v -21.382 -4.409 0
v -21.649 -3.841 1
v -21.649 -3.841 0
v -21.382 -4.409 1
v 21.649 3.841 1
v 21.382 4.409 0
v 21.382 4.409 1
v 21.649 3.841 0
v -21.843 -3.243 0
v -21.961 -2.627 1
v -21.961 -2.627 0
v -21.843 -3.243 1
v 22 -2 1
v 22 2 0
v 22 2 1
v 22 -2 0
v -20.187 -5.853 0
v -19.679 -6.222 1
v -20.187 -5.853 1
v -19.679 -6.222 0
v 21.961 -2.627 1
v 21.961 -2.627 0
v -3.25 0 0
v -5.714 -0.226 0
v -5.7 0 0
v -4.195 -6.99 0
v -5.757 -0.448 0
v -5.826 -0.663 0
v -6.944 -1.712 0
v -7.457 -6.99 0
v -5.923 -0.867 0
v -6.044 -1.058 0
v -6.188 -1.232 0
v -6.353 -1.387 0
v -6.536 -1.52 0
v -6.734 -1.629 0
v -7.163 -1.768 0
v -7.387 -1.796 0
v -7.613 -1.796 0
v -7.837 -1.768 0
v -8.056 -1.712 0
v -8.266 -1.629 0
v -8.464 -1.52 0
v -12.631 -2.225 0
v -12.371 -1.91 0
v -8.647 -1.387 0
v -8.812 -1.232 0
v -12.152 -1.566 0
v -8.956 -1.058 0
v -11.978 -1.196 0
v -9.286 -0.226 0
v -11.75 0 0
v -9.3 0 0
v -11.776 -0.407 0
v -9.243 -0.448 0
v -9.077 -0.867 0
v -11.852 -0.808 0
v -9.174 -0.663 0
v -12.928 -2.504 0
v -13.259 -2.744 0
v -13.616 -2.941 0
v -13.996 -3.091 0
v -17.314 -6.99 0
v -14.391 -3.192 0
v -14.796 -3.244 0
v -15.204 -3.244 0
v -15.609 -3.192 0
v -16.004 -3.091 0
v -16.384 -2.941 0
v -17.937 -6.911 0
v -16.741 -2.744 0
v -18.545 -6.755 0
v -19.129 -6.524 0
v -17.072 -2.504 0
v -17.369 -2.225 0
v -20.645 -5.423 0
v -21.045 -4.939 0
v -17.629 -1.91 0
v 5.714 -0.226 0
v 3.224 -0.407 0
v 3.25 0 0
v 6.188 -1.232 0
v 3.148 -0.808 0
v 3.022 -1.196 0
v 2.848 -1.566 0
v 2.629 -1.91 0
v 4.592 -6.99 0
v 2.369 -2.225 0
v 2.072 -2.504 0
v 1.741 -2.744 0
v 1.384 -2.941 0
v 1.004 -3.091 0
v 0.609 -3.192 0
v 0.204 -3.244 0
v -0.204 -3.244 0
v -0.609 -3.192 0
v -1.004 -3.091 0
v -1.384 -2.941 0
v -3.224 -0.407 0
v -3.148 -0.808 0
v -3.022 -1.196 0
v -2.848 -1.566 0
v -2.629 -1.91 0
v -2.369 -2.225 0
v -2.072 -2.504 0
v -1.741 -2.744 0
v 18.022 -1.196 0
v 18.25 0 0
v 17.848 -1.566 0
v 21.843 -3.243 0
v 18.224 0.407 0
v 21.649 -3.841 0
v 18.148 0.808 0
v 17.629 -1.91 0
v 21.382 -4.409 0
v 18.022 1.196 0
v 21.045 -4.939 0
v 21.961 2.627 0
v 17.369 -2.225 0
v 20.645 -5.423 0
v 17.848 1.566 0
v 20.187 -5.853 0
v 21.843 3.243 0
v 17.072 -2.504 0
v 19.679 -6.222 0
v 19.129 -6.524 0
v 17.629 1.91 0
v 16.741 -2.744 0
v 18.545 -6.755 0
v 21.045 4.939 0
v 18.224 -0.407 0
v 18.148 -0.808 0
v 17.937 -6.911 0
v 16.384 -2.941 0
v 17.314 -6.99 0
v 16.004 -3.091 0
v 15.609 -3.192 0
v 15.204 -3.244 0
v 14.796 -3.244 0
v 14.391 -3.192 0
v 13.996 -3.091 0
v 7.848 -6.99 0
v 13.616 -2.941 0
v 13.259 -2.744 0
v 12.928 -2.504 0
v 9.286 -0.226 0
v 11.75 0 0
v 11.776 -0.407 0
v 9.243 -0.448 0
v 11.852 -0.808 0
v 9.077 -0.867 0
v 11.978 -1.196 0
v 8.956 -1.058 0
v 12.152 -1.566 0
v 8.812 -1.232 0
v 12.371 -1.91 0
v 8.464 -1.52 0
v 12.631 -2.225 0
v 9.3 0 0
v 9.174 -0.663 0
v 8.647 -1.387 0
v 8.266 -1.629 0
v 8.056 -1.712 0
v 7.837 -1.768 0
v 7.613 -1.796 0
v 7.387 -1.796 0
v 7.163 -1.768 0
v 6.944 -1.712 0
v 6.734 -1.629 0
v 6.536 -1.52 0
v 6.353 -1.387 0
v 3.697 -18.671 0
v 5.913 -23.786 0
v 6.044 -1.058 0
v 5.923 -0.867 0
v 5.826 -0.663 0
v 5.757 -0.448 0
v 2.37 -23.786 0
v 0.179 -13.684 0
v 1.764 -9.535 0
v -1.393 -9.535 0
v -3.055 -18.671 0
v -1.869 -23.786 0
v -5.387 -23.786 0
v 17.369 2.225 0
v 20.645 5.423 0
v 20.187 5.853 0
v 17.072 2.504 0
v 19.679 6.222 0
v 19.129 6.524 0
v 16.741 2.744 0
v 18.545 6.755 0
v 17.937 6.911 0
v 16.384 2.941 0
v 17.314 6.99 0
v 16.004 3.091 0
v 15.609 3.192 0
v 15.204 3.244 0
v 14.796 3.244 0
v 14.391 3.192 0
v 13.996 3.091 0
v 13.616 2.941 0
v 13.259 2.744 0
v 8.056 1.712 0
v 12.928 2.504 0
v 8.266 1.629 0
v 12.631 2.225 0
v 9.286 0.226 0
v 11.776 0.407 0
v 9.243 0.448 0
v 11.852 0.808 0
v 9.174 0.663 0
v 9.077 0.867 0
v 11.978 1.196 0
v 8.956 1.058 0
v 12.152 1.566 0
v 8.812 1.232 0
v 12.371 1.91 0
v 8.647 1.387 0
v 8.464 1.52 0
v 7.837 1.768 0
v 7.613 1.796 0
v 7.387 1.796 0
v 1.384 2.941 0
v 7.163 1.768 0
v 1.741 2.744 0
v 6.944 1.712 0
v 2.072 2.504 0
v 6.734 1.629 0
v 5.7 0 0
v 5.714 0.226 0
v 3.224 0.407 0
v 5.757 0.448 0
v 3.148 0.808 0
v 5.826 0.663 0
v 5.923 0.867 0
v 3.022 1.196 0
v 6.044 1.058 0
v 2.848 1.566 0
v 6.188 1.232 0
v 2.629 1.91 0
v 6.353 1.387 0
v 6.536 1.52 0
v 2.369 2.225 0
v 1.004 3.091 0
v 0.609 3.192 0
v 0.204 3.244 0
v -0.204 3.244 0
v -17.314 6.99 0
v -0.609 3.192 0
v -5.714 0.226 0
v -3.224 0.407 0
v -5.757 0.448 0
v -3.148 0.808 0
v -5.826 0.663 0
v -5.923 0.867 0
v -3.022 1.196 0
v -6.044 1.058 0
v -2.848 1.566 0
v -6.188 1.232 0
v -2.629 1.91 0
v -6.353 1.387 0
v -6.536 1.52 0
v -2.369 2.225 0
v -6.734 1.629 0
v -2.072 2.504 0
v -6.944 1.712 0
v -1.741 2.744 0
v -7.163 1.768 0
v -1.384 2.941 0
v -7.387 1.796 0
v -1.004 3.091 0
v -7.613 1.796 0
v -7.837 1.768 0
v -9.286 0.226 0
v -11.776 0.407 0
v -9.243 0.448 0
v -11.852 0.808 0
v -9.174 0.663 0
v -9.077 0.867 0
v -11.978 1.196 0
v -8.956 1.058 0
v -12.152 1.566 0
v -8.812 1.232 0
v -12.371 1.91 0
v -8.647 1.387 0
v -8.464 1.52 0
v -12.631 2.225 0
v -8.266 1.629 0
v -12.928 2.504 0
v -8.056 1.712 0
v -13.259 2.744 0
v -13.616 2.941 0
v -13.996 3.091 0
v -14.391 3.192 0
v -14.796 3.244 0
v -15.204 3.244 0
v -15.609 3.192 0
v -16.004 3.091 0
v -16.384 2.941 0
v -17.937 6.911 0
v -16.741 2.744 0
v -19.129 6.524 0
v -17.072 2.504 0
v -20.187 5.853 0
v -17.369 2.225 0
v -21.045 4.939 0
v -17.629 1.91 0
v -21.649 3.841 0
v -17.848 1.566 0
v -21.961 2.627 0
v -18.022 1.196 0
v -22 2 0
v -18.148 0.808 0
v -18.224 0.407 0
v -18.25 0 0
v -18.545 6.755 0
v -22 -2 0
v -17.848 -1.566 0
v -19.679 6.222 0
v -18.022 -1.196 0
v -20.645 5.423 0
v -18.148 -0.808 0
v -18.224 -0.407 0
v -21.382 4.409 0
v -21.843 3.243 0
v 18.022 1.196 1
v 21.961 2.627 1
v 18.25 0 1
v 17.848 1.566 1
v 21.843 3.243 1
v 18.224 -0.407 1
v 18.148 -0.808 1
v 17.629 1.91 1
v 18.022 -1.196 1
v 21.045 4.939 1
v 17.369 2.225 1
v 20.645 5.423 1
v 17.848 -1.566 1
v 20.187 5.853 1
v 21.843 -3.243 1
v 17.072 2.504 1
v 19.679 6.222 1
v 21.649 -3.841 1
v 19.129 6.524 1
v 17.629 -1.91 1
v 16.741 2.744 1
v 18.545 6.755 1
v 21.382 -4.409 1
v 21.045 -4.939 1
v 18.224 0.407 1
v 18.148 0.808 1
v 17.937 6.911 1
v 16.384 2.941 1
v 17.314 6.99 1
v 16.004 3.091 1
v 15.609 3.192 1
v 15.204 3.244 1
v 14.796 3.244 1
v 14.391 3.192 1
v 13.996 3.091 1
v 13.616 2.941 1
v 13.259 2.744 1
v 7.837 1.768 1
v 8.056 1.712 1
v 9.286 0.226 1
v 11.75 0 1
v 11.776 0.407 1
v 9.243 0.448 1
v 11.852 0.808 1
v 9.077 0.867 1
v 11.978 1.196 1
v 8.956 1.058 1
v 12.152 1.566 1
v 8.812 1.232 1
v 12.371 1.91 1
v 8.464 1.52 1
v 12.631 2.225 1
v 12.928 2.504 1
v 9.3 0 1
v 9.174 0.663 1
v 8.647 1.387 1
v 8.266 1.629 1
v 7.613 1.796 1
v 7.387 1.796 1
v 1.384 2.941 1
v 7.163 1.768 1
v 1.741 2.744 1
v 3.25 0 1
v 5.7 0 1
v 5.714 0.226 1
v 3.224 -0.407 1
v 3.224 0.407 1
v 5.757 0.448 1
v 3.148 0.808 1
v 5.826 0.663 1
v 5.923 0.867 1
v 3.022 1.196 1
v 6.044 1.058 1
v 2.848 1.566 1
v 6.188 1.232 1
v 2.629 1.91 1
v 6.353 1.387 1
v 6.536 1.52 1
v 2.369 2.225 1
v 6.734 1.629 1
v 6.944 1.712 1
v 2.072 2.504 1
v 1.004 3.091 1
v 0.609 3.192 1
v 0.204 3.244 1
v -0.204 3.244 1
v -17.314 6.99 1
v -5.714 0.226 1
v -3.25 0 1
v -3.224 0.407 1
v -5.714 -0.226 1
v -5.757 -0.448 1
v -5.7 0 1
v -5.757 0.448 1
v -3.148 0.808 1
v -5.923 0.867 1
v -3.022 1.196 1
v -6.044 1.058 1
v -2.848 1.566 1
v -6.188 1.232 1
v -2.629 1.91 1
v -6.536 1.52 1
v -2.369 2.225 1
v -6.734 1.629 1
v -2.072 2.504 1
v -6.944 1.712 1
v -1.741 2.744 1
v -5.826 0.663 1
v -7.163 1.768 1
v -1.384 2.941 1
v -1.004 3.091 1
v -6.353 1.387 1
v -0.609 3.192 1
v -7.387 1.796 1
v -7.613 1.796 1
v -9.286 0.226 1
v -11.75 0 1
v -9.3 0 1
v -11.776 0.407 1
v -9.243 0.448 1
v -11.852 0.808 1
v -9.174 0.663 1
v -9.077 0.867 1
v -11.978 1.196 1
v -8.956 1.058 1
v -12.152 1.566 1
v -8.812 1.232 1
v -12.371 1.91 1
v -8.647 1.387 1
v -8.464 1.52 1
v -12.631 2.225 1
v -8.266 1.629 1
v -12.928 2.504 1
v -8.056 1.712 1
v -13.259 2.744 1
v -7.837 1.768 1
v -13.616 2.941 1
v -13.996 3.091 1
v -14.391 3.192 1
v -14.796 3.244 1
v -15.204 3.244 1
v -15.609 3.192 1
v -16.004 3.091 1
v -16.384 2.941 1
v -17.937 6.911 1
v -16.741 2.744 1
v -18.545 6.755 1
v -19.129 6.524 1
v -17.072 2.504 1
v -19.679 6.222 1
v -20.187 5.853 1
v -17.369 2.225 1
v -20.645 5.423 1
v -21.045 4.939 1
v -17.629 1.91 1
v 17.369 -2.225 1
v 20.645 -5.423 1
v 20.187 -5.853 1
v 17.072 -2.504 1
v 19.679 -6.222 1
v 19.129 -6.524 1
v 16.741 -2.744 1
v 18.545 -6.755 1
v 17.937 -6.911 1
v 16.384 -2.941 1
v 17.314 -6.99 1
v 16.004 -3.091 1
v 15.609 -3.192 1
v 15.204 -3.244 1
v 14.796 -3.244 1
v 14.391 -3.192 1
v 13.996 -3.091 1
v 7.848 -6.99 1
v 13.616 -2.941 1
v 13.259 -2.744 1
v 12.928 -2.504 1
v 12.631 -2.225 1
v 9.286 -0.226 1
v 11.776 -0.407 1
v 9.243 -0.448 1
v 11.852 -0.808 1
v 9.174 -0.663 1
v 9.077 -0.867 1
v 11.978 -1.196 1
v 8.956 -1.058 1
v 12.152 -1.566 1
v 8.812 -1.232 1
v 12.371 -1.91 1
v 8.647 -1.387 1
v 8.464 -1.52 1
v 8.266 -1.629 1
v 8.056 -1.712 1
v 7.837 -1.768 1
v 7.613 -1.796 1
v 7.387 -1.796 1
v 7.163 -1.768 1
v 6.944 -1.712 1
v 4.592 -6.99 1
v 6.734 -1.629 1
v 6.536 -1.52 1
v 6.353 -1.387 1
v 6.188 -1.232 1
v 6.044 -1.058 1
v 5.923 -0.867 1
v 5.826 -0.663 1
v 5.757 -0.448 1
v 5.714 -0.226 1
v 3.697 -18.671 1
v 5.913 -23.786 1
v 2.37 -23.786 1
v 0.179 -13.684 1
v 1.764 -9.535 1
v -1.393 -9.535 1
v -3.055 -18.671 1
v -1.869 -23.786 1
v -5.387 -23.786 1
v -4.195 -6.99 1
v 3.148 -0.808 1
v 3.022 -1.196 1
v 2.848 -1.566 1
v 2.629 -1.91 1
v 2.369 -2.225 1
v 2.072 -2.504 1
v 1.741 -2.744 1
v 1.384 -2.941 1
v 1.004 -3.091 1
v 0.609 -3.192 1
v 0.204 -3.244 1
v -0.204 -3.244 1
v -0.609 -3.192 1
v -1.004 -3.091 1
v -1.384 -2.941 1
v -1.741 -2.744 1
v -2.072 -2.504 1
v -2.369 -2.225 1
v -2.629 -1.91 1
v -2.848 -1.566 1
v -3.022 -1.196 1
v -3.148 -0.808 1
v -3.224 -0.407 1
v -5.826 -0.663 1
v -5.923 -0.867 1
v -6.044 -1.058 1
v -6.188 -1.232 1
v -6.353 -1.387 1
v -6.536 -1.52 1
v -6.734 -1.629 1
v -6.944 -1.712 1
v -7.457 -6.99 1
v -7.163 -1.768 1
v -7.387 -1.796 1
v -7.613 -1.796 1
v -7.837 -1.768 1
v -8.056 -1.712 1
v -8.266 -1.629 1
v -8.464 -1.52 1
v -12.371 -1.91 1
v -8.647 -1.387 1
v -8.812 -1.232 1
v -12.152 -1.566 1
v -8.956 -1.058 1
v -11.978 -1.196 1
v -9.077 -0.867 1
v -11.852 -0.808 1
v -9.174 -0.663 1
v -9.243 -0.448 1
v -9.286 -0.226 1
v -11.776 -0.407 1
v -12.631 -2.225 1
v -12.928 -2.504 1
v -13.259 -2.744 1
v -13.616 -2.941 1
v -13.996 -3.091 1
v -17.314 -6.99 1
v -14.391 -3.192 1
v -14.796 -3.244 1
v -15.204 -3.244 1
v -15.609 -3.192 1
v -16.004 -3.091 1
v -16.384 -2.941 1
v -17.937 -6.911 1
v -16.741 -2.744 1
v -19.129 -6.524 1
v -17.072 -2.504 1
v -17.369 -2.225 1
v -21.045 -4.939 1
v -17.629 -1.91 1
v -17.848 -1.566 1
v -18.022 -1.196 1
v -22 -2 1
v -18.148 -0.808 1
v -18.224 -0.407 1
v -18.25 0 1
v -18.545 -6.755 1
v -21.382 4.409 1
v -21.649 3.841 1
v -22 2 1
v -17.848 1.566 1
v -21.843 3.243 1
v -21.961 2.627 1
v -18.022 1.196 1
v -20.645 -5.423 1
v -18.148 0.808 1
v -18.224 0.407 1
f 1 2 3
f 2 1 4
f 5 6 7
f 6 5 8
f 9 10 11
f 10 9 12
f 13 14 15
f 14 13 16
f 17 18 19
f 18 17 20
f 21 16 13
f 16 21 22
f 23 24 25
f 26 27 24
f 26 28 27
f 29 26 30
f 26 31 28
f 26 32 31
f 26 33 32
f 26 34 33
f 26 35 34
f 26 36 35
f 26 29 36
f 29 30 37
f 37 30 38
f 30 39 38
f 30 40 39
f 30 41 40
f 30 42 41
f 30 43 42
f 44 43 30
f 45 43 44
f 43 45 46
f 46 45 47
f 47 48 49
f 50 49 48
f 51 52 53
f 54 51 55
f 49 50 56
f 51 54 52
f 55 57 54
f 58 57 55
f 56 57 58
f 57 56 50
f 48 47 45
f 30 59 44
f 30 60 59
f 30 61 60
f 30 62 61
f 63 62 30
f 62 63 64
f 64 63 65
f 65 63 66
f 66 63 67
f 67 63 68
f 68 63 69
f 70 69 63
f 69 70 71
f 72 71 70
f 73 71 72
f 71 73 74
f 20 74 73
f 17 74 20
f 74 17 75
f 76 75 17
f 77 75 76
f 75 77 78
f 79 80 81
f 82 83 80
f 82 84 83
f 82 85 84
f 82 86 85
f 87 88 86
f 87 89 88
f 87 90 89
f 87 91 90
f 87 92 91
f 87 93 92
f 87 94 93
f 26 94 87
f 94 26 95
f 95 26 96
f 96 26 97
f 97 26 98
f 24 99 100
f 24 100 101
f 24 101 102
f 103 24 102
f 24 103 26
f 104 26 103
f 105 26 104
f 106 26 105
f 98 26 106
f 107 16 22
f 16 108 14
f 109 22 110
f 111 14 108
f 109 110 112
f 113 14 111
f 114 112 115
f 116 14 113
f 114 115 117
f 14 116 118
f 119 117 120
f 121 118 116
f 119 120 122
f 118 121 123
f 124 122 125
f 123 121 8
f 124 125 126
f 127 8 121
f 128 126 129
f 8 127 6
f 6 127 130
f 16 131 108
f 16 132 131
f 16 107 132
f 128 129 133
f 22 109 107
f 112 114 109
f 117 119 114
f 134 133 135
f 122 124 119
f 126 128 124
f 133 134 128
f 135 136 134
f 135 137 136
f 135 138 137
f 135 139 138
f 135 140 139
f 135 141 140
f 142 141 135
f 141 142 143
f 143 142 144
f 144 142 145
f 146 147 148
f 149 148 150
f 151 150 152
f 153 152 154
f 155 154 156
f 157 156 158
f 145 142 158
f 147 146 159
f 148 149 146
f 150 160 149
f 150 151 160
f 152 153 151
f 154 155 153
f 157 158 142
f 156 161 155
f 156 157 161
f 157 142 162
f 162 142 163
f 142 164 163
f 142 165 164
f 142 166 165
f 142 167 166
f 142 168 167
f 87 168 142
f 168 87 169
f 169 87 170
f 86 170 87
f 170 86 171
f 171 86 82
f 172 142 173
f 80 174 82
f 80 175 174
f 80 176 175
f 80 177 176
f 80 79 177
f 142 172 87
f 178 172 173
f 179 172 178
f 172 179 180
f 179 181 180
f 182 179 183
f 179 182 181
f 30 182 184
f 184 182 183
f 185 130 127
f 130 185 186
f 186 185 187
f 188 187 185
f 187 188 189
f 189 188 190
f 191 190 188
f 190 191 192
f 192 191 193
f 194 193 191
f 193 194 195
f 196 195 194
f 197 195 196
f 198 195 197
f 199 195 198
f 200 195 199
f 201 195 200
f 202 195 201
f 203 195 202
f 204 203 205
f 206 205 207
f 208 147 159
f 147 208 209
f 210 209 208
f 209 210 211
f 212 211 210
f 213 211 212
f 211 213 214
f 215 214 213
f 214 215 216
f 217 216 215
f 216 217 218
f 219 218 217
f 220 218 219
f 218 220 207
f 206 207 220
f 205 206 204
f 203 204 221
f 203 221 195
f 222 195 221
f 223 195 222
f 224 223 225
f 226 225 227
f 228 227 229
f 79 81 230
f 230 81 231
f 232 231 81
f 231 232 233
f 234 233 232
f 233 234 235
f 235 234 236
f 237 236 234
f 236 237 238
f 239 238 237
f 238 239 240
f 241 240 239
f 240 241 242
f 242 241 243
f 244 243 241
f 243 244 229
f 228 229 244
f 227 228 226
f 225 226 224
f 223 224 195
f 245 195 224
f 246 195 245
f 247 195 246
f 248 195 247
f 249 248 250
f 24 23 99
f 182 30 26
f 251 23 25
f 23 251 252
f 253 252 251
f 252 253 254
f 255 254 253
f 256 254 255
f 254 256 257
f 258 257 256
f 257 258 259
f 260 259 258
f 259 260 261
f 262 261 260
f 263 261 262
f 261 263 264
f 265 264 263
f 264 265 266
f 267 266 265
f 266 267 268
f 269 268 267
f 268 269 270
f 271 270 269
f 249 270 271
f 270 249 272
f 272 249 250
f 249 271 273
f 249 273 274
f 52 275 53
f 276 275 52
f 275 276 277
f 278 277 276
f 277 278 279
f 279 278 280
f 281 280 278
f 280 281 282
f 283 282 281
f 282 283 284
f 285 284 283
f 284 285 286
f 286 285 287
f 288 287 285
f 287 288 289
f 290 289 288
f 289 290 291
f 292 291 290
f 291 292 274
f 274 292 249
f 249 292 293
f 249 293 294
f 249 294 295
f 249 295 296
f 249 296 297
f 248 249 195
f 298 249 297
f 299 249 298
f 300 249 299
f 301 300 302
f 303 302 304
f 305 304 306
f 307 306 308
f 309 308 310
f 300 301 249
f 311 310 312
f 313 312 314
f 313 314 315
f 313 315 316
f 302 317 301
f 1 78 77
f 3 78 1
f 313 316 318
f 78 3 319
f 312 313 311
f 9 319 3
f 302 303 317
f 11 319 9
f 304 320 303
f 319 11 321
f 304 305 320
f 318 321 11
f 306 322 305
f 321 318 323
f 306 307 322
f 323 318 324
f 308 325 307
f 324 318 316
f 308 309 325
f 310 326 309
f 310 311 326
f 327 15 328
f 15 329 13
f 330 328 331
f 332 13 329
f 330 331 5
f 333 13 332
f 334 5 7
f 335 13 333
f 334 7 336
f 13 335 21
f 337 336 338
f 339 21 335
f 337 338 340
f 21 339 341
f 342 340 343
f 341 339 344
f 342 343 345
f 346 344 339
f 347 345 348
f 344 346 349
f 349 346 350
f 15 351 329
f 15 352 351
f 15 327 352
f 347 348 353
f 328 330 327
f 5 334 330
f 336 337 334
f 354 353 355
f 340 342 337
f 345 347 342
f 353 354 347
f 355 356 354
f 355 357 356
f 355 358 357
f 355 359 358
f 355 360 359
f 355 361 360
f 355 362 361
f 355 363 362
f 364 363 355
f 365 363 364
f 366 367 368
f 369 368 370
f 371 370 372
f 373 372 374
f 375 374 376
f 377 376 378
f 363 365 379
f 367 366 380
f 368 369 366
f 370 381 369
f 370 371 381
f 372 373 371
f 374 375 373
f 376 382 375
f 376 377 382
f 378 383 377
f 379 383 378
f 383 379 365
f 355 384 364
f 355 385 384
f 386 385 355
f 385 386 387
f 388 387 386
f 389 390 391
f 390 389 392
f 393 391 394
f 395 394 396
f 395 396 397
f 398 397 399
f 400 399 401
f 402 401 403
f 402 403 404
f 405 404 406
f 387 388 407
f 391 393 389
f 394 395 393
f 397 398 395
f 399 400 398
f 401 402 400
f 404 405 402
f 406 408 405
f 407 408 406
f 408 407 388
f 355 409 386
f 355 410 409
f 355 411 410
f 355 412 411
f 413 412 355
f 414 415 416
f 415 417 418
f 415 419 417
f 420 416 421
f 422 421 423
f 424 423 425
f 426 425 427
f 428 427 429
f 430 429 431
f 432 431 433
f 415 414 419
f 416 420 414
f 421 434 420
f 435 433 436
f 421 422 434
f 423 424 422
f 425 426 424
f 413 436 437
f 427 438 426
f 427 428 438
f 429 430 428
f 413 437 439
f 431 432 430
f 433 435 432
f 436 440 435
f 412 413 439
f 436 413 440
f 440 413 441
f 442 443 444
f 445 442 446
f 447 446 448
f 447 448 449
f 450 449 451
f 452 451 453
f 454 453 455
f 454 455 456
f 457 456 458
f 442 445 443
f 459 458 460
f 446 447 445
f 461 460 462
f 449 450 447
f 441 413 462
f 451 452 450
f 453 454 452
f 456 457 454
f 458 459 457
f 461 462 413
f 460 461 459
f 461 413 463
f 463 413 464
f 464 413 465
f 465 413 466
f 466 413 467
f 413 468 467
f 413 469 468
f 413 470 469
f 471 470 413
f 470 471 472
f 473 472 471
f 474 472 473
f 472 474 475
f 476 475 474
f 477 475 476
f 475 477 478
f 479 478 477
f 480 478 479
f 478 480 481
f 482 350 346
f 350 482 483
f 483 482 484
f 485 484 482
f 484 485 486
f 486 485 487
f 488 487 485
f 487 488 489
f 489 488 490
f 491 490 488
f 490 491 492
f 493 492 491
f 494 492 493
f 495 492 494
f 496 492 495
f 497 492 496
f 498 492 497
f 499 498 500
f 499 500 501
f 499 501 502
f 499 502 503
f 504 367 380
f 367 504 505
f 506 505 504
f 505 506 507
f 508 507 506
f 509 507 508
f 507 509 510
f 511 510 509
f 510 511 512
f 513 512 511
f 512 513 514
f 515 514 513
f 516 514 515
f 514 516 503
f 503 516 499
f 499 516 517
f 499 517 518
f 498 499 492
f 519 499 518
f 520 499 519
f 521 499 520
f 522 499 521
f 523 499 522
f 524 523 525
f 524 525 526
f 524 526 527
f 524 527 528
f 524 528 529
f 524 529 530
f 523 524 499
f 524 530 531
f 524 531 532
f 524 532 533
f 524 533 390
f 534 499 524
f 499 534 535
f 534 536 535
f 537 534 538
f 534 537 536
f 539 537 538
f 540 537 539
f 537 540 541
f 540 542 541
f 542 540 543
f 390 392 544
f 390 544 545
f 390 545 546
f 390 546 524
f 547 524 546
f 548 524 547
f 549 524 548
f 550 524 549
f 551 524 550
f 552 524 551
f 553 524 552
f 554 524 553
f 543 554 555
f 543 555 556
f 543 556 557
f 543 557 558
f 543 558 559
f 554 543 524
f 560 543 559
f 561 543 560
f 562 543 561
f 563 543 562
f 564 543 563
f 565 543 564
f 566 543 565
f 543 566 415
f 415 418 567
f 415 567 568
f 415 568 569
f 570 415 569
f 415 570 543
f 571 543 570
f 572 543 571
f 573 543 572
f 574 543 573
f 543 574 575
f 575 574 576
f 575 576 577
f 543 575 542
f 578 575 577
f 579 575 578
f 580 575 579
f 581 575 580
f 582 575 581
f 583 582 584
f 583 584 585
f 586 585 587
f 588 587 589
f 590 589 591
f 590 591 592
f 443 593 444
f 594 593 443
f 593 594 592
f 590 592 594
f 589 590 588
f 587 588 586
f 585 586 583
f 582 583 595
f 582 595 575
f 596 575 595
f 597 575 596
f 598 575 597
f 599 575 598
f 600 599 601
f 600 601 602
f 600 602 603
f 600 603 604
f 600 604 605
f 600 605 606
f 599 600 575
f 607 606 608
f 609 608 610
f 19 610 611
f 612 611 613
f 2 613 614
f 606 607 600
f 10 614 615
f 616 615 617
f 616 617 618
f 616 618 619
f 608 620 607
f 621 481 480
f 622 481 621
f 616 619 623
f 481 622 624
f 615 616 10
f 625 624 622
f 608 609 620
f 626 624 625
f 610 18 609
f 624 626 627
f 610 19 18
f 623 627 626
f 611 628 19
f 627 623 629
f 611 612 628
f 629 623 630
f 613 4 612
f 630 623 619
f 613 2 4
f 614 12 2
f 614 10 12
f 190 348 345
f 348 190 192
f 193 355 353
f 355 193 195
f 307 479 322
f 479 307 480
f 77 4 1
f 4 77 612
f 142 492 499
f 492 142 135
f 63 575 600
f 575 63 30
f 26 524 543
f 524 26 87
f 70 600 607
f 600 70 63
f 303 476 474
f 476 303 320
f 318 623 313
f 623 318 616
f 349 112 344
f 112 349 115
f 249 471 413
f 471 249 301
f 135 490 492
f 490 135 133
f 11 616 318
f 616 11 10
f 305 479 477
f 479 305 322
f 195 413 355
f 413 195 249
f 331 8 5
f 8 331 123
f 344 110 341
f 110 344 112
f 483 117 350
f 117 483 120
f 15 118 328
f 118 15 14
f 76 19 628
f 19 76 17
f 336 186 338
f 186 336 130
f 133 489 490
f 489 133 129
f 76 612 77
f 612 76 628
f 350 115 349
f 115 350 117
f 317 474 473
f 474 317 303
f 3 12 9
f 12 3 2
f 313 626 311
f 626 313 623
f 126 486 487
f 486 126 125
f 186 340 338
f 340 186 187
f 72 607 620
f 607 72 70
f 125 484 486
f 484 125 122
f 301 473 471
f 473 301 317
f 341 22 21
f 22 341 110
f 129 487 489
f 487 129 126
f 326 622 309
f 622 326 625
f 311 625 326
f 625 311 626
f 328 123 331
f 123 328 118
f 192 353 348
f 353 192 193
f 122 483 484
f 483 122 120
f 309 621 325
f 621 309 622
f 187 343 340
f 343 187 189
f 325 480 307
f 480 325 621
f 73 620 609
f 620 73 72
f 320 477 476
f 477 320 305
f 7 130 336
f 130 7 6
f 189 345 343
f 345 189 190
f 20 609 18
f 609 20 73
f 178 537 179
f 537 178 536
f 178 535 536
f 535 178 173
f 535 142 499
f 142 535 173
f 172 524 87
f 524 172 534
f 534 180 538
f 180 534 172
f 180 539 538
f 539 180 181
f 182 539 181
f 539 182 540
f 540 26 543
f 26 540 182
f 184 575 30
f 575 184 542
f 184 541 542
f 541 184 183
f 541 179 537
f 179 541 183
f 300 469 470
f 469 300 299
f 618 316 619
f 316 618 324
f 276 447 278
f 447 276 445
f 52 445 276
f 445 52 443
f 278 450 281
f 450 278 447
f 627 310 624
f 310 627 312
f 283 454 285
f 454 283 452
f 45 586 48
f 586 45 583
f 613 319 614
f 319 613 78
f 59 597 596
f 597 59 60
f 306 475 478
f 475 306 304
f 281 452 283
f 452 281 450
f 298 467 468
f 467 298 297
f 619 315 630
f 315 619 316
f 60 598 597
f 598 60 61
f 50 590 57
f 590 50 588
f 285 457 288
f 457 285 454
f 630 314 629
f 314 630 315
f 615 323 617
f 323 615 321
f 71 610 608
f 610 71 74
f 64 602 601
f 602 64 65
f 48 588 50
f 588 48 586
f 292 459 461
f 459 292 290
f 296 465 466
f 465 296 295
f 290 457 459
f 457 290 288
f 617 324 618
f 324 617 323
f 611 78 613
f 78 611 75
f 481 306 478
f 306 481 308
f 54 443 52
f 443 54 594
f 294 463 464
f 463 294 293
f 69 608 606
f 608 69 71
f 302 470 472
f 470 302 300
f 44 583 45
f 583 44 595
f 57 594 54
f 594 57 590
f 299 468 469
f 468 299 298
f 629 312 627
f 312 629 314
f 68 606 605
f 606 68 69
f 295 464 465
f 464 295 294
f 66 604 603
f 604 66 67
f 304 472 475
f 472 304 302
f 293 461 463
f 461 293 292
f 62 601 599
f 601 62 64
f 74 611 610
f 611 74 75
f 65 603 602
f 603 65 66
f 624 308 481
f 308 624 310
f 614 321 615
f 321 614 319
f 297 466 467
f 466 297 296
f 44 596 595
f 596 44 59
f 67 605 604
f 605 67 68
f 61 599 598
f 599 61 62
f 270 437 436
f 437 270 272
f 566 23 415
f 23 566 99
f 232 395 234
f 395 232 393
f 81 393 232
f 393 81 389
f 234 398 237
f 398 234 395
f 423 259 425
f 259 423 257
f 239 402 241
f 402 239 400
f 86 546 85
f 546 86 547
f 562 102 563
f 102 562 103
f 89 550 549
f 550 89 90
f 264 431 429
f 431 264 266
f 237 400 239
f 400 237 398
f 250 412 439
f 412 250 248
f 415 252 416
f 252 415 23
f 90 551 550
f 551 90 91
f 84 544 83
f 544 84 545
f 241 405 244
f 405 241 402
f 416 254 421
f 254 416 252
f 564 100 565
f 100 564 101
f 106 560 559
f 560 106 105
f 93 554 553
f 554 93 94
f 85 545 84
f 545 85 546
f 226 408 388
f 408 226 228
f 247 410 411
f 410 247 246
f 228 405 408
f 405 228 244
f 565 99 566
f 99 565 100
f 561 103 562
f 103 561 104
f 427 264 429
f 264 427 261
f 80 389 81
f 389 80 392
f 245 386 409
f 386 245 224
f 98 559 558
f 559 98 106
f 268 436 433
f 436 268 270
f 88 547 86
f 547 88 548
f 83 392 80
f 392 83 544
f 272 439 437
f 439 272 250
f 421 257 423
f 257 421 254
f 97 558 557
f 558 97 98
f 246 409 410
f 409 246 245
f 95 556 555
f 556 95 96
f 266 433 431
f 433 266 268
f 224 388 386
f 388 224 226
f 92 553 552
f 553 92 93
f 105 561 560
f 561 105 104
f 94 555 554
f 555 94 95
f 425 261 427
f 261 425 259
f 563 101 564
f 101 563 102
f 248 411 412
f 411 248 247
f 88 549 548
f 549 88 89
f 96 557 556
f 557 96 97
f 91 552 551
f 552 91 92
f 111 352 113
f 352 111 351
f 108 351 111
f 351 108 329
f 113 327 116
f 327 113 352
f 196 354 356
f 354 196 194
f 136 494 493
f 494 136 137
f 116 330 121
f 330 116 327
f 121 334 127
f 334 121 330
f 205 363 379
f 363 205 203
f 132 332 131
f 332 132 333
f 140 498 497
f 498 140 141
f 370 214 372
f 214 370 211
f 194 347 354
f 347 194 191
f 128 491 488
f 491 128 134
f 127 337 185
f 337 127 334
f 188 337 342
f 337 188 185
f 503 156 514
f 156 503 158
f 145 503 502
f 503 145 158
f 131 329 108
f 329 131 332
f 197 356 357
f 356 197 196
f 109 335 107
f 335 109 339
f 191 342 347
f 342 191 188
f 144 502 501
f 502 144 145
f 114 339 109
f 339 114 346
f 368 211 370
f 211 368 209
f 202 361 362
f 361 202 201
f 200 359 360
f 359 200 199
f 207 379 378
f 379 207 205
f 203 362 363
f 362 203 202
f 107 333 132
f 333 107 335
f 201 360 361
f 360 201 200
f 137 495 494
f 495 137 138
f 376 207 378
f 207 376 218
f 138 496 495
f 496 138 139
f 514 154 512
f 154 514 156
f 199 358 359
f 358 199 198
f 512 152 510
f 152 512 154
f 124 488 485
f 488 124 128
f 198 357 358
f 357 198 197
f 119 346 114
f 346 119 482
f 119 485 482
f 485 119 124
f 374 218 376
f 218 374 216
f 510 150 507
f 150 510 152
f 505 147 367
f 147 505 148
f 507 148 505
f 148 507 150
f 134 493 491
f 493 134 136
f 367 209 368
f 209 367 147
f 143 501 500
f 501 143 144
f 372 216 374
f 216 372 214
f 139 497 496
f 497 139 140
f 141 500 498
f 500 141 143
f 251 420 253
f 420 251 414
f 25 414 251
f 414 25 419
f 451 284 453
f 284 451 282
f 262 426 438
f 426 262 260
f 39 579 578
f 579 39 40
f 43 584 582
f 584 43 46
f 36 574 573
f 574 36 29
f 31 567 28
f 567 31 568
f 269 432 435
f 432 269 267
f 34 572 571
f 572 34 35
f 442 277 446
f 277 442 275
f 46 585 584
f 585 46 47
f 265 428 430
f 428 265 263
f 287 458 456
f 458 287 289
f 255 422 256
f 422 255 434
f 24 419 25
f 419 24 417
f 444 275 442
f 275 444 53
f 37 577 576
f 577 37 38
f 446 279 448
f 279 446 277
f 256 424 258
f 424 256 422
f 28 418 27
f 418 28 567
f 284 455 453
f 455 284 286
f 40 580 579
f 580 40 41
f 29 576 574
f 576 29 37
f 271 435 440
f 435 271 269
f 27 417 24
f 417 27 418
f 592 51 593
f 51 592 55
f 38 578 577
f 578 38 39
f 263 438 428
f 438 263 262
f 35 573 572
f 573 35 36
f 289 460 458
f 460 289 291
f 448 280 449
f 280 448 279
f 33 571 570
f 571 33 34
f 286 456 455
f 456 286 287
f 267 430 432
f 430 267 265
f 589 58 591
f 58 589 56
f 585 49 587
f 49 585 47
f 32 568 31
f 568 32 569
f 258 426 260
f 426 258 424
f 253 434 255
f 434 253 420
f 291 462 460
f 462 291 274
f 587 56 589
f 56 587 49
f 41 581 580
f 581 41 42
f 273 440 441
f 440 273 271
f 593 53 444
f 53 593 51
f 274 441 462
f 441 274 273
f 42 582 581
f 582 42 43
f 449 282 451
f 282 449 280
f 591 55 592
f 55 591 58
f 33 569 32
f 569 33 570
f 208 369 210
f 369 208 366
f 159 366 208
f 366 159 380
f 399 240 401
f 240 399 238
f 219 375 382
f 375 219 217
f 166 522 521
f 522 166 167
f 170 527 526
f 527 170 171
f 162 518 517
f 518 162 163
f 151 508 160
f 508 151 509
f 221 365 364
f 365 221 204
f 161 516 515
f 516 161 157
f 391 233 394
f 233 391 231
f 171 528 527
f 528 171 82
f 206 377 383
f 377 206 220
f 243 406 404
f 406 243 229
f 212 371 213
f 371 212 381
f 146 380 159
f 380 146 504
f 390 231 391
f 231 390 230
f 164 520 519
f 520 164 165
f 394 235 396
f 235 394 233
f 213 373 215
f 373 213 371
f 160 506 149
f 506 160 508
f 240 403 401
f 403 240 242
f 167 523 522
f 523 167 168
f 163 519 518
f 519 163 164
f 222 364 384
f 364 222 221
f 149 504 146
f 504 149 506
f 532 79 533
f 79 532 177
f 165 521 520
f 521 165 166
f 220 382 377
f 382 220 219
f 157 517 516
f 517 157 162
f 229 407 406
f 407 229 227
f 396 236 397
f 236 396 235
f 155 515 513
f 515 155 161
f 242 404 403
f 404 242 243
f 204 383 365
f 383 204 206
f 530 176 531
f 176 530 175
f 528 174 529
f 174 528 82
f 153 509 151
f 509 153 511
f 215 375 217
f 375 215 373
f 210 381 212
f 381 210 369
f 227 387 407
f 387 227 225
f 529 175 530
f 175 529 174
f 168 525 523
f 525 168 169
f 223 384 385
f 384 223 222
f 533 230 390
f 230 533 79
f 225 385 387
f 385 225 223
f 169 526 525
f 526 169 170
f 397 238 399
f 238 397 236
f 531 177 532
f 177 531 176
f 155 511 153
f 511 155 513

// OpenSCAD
$fn = 50;


difference() {
	union() {
		*color(alpha = 1.0000000000, c = "gray") {
			translate(v = [0, 14, 0]) {
				linear_extrude(height = 1) {
					text(font = "Arial:style=Bold", halign = "center", size = 4.5000000000, text = "COMMENT description oobb_plate_shape_p_type_1_depth_3_width_1_thickness_w_extra_oobb_size", valign = "center");
				}
			}
		}
		hull() {
			translate(v = [-17.0000000000, 2.0000000000, 0]) {
				cylinder(h = 1, r = 5);
			}
			translate(v = [17.0000000000, 2.0000000000, 0]) {
				cylinder(h = 1, r = 5);
			}
			translate(v = [-17.0000000000, -2.0000000000, 0]) {
				cylinder(h = 1, r = 5);
			}
			translate(v = [17.0000000000, -2.0000000000, 0]) {
				cylinder(h = 1, r = 5);
			}
		}
		translate(v = [0, -5, 0]) {
			linear_extrude(height = 1) {
				text(font = "DejaVu Sans Mono:style=Bold", halign = "center", size = 19.0000000000, text = "W", valign = "top");
			}
		}
	}
	union() {
		*color(alpha = 1.0000000000, c = "gray") {
			translate(v = [0, 14, 0]) {
				linear_extrude(height = 1) {
					text(font = "Arial:style=Bold", halign = "center", size = 4.5000000000, text = "COMMENT description oobb_holes_shape_n_type_3_width_1_thickness_w_extra_oobb_size_1_height_'all'_holes_true_both_holes", valign = "center");
				}
			}
		}
		translate(v = [-15.0000000000, 0.0000000000, 0]) {
			translate(v = [0, 0, -50]) {
				cylinder(h = 100, r = 3.2500000000);
			}
		}
		translate(v = [0, 0, -50]) {
			cylinder(h = 100, r = 3.2500000000);
		}
		translate(v = [15.0000000000, 0.0000000000, 0]) {
			translate(v = [0, 0, -50]) {
				cylinder(h = 100, r = 3.2500000000);
			}
		}
		translate(v = [-15.0000000000, 0.0000000000, 0]) {
			translate(v = [0, 0, -50]) {
				cylinder(h = 100, r = 1.8000000000);
			}
		}
		translate(v = [-7.5000000000, 0.0000000000, 0]) {
			translate(v = [0, 0, -50]) {
				cylinder(h = 100, r = 1.8000000000);
			}
		}
		translate(v = [0, 0, -50]) {
			cylinder(h = 100, r = 1.8000000000);
		}
		translate(v = [7.5000000000, 0.0000000000, 0]) {
			translate(v = [0, 0, -50]) {
				cylinder(h = 100, r = 1.8000000000);
			}
		}
		translate(v = [15.0000000000, 0.0000000000, 0]) {
			translate(v = [0, 0, -50]) {
				cylinder(h = 100, r = 1.8000000000);
			}
		}
	}
}
